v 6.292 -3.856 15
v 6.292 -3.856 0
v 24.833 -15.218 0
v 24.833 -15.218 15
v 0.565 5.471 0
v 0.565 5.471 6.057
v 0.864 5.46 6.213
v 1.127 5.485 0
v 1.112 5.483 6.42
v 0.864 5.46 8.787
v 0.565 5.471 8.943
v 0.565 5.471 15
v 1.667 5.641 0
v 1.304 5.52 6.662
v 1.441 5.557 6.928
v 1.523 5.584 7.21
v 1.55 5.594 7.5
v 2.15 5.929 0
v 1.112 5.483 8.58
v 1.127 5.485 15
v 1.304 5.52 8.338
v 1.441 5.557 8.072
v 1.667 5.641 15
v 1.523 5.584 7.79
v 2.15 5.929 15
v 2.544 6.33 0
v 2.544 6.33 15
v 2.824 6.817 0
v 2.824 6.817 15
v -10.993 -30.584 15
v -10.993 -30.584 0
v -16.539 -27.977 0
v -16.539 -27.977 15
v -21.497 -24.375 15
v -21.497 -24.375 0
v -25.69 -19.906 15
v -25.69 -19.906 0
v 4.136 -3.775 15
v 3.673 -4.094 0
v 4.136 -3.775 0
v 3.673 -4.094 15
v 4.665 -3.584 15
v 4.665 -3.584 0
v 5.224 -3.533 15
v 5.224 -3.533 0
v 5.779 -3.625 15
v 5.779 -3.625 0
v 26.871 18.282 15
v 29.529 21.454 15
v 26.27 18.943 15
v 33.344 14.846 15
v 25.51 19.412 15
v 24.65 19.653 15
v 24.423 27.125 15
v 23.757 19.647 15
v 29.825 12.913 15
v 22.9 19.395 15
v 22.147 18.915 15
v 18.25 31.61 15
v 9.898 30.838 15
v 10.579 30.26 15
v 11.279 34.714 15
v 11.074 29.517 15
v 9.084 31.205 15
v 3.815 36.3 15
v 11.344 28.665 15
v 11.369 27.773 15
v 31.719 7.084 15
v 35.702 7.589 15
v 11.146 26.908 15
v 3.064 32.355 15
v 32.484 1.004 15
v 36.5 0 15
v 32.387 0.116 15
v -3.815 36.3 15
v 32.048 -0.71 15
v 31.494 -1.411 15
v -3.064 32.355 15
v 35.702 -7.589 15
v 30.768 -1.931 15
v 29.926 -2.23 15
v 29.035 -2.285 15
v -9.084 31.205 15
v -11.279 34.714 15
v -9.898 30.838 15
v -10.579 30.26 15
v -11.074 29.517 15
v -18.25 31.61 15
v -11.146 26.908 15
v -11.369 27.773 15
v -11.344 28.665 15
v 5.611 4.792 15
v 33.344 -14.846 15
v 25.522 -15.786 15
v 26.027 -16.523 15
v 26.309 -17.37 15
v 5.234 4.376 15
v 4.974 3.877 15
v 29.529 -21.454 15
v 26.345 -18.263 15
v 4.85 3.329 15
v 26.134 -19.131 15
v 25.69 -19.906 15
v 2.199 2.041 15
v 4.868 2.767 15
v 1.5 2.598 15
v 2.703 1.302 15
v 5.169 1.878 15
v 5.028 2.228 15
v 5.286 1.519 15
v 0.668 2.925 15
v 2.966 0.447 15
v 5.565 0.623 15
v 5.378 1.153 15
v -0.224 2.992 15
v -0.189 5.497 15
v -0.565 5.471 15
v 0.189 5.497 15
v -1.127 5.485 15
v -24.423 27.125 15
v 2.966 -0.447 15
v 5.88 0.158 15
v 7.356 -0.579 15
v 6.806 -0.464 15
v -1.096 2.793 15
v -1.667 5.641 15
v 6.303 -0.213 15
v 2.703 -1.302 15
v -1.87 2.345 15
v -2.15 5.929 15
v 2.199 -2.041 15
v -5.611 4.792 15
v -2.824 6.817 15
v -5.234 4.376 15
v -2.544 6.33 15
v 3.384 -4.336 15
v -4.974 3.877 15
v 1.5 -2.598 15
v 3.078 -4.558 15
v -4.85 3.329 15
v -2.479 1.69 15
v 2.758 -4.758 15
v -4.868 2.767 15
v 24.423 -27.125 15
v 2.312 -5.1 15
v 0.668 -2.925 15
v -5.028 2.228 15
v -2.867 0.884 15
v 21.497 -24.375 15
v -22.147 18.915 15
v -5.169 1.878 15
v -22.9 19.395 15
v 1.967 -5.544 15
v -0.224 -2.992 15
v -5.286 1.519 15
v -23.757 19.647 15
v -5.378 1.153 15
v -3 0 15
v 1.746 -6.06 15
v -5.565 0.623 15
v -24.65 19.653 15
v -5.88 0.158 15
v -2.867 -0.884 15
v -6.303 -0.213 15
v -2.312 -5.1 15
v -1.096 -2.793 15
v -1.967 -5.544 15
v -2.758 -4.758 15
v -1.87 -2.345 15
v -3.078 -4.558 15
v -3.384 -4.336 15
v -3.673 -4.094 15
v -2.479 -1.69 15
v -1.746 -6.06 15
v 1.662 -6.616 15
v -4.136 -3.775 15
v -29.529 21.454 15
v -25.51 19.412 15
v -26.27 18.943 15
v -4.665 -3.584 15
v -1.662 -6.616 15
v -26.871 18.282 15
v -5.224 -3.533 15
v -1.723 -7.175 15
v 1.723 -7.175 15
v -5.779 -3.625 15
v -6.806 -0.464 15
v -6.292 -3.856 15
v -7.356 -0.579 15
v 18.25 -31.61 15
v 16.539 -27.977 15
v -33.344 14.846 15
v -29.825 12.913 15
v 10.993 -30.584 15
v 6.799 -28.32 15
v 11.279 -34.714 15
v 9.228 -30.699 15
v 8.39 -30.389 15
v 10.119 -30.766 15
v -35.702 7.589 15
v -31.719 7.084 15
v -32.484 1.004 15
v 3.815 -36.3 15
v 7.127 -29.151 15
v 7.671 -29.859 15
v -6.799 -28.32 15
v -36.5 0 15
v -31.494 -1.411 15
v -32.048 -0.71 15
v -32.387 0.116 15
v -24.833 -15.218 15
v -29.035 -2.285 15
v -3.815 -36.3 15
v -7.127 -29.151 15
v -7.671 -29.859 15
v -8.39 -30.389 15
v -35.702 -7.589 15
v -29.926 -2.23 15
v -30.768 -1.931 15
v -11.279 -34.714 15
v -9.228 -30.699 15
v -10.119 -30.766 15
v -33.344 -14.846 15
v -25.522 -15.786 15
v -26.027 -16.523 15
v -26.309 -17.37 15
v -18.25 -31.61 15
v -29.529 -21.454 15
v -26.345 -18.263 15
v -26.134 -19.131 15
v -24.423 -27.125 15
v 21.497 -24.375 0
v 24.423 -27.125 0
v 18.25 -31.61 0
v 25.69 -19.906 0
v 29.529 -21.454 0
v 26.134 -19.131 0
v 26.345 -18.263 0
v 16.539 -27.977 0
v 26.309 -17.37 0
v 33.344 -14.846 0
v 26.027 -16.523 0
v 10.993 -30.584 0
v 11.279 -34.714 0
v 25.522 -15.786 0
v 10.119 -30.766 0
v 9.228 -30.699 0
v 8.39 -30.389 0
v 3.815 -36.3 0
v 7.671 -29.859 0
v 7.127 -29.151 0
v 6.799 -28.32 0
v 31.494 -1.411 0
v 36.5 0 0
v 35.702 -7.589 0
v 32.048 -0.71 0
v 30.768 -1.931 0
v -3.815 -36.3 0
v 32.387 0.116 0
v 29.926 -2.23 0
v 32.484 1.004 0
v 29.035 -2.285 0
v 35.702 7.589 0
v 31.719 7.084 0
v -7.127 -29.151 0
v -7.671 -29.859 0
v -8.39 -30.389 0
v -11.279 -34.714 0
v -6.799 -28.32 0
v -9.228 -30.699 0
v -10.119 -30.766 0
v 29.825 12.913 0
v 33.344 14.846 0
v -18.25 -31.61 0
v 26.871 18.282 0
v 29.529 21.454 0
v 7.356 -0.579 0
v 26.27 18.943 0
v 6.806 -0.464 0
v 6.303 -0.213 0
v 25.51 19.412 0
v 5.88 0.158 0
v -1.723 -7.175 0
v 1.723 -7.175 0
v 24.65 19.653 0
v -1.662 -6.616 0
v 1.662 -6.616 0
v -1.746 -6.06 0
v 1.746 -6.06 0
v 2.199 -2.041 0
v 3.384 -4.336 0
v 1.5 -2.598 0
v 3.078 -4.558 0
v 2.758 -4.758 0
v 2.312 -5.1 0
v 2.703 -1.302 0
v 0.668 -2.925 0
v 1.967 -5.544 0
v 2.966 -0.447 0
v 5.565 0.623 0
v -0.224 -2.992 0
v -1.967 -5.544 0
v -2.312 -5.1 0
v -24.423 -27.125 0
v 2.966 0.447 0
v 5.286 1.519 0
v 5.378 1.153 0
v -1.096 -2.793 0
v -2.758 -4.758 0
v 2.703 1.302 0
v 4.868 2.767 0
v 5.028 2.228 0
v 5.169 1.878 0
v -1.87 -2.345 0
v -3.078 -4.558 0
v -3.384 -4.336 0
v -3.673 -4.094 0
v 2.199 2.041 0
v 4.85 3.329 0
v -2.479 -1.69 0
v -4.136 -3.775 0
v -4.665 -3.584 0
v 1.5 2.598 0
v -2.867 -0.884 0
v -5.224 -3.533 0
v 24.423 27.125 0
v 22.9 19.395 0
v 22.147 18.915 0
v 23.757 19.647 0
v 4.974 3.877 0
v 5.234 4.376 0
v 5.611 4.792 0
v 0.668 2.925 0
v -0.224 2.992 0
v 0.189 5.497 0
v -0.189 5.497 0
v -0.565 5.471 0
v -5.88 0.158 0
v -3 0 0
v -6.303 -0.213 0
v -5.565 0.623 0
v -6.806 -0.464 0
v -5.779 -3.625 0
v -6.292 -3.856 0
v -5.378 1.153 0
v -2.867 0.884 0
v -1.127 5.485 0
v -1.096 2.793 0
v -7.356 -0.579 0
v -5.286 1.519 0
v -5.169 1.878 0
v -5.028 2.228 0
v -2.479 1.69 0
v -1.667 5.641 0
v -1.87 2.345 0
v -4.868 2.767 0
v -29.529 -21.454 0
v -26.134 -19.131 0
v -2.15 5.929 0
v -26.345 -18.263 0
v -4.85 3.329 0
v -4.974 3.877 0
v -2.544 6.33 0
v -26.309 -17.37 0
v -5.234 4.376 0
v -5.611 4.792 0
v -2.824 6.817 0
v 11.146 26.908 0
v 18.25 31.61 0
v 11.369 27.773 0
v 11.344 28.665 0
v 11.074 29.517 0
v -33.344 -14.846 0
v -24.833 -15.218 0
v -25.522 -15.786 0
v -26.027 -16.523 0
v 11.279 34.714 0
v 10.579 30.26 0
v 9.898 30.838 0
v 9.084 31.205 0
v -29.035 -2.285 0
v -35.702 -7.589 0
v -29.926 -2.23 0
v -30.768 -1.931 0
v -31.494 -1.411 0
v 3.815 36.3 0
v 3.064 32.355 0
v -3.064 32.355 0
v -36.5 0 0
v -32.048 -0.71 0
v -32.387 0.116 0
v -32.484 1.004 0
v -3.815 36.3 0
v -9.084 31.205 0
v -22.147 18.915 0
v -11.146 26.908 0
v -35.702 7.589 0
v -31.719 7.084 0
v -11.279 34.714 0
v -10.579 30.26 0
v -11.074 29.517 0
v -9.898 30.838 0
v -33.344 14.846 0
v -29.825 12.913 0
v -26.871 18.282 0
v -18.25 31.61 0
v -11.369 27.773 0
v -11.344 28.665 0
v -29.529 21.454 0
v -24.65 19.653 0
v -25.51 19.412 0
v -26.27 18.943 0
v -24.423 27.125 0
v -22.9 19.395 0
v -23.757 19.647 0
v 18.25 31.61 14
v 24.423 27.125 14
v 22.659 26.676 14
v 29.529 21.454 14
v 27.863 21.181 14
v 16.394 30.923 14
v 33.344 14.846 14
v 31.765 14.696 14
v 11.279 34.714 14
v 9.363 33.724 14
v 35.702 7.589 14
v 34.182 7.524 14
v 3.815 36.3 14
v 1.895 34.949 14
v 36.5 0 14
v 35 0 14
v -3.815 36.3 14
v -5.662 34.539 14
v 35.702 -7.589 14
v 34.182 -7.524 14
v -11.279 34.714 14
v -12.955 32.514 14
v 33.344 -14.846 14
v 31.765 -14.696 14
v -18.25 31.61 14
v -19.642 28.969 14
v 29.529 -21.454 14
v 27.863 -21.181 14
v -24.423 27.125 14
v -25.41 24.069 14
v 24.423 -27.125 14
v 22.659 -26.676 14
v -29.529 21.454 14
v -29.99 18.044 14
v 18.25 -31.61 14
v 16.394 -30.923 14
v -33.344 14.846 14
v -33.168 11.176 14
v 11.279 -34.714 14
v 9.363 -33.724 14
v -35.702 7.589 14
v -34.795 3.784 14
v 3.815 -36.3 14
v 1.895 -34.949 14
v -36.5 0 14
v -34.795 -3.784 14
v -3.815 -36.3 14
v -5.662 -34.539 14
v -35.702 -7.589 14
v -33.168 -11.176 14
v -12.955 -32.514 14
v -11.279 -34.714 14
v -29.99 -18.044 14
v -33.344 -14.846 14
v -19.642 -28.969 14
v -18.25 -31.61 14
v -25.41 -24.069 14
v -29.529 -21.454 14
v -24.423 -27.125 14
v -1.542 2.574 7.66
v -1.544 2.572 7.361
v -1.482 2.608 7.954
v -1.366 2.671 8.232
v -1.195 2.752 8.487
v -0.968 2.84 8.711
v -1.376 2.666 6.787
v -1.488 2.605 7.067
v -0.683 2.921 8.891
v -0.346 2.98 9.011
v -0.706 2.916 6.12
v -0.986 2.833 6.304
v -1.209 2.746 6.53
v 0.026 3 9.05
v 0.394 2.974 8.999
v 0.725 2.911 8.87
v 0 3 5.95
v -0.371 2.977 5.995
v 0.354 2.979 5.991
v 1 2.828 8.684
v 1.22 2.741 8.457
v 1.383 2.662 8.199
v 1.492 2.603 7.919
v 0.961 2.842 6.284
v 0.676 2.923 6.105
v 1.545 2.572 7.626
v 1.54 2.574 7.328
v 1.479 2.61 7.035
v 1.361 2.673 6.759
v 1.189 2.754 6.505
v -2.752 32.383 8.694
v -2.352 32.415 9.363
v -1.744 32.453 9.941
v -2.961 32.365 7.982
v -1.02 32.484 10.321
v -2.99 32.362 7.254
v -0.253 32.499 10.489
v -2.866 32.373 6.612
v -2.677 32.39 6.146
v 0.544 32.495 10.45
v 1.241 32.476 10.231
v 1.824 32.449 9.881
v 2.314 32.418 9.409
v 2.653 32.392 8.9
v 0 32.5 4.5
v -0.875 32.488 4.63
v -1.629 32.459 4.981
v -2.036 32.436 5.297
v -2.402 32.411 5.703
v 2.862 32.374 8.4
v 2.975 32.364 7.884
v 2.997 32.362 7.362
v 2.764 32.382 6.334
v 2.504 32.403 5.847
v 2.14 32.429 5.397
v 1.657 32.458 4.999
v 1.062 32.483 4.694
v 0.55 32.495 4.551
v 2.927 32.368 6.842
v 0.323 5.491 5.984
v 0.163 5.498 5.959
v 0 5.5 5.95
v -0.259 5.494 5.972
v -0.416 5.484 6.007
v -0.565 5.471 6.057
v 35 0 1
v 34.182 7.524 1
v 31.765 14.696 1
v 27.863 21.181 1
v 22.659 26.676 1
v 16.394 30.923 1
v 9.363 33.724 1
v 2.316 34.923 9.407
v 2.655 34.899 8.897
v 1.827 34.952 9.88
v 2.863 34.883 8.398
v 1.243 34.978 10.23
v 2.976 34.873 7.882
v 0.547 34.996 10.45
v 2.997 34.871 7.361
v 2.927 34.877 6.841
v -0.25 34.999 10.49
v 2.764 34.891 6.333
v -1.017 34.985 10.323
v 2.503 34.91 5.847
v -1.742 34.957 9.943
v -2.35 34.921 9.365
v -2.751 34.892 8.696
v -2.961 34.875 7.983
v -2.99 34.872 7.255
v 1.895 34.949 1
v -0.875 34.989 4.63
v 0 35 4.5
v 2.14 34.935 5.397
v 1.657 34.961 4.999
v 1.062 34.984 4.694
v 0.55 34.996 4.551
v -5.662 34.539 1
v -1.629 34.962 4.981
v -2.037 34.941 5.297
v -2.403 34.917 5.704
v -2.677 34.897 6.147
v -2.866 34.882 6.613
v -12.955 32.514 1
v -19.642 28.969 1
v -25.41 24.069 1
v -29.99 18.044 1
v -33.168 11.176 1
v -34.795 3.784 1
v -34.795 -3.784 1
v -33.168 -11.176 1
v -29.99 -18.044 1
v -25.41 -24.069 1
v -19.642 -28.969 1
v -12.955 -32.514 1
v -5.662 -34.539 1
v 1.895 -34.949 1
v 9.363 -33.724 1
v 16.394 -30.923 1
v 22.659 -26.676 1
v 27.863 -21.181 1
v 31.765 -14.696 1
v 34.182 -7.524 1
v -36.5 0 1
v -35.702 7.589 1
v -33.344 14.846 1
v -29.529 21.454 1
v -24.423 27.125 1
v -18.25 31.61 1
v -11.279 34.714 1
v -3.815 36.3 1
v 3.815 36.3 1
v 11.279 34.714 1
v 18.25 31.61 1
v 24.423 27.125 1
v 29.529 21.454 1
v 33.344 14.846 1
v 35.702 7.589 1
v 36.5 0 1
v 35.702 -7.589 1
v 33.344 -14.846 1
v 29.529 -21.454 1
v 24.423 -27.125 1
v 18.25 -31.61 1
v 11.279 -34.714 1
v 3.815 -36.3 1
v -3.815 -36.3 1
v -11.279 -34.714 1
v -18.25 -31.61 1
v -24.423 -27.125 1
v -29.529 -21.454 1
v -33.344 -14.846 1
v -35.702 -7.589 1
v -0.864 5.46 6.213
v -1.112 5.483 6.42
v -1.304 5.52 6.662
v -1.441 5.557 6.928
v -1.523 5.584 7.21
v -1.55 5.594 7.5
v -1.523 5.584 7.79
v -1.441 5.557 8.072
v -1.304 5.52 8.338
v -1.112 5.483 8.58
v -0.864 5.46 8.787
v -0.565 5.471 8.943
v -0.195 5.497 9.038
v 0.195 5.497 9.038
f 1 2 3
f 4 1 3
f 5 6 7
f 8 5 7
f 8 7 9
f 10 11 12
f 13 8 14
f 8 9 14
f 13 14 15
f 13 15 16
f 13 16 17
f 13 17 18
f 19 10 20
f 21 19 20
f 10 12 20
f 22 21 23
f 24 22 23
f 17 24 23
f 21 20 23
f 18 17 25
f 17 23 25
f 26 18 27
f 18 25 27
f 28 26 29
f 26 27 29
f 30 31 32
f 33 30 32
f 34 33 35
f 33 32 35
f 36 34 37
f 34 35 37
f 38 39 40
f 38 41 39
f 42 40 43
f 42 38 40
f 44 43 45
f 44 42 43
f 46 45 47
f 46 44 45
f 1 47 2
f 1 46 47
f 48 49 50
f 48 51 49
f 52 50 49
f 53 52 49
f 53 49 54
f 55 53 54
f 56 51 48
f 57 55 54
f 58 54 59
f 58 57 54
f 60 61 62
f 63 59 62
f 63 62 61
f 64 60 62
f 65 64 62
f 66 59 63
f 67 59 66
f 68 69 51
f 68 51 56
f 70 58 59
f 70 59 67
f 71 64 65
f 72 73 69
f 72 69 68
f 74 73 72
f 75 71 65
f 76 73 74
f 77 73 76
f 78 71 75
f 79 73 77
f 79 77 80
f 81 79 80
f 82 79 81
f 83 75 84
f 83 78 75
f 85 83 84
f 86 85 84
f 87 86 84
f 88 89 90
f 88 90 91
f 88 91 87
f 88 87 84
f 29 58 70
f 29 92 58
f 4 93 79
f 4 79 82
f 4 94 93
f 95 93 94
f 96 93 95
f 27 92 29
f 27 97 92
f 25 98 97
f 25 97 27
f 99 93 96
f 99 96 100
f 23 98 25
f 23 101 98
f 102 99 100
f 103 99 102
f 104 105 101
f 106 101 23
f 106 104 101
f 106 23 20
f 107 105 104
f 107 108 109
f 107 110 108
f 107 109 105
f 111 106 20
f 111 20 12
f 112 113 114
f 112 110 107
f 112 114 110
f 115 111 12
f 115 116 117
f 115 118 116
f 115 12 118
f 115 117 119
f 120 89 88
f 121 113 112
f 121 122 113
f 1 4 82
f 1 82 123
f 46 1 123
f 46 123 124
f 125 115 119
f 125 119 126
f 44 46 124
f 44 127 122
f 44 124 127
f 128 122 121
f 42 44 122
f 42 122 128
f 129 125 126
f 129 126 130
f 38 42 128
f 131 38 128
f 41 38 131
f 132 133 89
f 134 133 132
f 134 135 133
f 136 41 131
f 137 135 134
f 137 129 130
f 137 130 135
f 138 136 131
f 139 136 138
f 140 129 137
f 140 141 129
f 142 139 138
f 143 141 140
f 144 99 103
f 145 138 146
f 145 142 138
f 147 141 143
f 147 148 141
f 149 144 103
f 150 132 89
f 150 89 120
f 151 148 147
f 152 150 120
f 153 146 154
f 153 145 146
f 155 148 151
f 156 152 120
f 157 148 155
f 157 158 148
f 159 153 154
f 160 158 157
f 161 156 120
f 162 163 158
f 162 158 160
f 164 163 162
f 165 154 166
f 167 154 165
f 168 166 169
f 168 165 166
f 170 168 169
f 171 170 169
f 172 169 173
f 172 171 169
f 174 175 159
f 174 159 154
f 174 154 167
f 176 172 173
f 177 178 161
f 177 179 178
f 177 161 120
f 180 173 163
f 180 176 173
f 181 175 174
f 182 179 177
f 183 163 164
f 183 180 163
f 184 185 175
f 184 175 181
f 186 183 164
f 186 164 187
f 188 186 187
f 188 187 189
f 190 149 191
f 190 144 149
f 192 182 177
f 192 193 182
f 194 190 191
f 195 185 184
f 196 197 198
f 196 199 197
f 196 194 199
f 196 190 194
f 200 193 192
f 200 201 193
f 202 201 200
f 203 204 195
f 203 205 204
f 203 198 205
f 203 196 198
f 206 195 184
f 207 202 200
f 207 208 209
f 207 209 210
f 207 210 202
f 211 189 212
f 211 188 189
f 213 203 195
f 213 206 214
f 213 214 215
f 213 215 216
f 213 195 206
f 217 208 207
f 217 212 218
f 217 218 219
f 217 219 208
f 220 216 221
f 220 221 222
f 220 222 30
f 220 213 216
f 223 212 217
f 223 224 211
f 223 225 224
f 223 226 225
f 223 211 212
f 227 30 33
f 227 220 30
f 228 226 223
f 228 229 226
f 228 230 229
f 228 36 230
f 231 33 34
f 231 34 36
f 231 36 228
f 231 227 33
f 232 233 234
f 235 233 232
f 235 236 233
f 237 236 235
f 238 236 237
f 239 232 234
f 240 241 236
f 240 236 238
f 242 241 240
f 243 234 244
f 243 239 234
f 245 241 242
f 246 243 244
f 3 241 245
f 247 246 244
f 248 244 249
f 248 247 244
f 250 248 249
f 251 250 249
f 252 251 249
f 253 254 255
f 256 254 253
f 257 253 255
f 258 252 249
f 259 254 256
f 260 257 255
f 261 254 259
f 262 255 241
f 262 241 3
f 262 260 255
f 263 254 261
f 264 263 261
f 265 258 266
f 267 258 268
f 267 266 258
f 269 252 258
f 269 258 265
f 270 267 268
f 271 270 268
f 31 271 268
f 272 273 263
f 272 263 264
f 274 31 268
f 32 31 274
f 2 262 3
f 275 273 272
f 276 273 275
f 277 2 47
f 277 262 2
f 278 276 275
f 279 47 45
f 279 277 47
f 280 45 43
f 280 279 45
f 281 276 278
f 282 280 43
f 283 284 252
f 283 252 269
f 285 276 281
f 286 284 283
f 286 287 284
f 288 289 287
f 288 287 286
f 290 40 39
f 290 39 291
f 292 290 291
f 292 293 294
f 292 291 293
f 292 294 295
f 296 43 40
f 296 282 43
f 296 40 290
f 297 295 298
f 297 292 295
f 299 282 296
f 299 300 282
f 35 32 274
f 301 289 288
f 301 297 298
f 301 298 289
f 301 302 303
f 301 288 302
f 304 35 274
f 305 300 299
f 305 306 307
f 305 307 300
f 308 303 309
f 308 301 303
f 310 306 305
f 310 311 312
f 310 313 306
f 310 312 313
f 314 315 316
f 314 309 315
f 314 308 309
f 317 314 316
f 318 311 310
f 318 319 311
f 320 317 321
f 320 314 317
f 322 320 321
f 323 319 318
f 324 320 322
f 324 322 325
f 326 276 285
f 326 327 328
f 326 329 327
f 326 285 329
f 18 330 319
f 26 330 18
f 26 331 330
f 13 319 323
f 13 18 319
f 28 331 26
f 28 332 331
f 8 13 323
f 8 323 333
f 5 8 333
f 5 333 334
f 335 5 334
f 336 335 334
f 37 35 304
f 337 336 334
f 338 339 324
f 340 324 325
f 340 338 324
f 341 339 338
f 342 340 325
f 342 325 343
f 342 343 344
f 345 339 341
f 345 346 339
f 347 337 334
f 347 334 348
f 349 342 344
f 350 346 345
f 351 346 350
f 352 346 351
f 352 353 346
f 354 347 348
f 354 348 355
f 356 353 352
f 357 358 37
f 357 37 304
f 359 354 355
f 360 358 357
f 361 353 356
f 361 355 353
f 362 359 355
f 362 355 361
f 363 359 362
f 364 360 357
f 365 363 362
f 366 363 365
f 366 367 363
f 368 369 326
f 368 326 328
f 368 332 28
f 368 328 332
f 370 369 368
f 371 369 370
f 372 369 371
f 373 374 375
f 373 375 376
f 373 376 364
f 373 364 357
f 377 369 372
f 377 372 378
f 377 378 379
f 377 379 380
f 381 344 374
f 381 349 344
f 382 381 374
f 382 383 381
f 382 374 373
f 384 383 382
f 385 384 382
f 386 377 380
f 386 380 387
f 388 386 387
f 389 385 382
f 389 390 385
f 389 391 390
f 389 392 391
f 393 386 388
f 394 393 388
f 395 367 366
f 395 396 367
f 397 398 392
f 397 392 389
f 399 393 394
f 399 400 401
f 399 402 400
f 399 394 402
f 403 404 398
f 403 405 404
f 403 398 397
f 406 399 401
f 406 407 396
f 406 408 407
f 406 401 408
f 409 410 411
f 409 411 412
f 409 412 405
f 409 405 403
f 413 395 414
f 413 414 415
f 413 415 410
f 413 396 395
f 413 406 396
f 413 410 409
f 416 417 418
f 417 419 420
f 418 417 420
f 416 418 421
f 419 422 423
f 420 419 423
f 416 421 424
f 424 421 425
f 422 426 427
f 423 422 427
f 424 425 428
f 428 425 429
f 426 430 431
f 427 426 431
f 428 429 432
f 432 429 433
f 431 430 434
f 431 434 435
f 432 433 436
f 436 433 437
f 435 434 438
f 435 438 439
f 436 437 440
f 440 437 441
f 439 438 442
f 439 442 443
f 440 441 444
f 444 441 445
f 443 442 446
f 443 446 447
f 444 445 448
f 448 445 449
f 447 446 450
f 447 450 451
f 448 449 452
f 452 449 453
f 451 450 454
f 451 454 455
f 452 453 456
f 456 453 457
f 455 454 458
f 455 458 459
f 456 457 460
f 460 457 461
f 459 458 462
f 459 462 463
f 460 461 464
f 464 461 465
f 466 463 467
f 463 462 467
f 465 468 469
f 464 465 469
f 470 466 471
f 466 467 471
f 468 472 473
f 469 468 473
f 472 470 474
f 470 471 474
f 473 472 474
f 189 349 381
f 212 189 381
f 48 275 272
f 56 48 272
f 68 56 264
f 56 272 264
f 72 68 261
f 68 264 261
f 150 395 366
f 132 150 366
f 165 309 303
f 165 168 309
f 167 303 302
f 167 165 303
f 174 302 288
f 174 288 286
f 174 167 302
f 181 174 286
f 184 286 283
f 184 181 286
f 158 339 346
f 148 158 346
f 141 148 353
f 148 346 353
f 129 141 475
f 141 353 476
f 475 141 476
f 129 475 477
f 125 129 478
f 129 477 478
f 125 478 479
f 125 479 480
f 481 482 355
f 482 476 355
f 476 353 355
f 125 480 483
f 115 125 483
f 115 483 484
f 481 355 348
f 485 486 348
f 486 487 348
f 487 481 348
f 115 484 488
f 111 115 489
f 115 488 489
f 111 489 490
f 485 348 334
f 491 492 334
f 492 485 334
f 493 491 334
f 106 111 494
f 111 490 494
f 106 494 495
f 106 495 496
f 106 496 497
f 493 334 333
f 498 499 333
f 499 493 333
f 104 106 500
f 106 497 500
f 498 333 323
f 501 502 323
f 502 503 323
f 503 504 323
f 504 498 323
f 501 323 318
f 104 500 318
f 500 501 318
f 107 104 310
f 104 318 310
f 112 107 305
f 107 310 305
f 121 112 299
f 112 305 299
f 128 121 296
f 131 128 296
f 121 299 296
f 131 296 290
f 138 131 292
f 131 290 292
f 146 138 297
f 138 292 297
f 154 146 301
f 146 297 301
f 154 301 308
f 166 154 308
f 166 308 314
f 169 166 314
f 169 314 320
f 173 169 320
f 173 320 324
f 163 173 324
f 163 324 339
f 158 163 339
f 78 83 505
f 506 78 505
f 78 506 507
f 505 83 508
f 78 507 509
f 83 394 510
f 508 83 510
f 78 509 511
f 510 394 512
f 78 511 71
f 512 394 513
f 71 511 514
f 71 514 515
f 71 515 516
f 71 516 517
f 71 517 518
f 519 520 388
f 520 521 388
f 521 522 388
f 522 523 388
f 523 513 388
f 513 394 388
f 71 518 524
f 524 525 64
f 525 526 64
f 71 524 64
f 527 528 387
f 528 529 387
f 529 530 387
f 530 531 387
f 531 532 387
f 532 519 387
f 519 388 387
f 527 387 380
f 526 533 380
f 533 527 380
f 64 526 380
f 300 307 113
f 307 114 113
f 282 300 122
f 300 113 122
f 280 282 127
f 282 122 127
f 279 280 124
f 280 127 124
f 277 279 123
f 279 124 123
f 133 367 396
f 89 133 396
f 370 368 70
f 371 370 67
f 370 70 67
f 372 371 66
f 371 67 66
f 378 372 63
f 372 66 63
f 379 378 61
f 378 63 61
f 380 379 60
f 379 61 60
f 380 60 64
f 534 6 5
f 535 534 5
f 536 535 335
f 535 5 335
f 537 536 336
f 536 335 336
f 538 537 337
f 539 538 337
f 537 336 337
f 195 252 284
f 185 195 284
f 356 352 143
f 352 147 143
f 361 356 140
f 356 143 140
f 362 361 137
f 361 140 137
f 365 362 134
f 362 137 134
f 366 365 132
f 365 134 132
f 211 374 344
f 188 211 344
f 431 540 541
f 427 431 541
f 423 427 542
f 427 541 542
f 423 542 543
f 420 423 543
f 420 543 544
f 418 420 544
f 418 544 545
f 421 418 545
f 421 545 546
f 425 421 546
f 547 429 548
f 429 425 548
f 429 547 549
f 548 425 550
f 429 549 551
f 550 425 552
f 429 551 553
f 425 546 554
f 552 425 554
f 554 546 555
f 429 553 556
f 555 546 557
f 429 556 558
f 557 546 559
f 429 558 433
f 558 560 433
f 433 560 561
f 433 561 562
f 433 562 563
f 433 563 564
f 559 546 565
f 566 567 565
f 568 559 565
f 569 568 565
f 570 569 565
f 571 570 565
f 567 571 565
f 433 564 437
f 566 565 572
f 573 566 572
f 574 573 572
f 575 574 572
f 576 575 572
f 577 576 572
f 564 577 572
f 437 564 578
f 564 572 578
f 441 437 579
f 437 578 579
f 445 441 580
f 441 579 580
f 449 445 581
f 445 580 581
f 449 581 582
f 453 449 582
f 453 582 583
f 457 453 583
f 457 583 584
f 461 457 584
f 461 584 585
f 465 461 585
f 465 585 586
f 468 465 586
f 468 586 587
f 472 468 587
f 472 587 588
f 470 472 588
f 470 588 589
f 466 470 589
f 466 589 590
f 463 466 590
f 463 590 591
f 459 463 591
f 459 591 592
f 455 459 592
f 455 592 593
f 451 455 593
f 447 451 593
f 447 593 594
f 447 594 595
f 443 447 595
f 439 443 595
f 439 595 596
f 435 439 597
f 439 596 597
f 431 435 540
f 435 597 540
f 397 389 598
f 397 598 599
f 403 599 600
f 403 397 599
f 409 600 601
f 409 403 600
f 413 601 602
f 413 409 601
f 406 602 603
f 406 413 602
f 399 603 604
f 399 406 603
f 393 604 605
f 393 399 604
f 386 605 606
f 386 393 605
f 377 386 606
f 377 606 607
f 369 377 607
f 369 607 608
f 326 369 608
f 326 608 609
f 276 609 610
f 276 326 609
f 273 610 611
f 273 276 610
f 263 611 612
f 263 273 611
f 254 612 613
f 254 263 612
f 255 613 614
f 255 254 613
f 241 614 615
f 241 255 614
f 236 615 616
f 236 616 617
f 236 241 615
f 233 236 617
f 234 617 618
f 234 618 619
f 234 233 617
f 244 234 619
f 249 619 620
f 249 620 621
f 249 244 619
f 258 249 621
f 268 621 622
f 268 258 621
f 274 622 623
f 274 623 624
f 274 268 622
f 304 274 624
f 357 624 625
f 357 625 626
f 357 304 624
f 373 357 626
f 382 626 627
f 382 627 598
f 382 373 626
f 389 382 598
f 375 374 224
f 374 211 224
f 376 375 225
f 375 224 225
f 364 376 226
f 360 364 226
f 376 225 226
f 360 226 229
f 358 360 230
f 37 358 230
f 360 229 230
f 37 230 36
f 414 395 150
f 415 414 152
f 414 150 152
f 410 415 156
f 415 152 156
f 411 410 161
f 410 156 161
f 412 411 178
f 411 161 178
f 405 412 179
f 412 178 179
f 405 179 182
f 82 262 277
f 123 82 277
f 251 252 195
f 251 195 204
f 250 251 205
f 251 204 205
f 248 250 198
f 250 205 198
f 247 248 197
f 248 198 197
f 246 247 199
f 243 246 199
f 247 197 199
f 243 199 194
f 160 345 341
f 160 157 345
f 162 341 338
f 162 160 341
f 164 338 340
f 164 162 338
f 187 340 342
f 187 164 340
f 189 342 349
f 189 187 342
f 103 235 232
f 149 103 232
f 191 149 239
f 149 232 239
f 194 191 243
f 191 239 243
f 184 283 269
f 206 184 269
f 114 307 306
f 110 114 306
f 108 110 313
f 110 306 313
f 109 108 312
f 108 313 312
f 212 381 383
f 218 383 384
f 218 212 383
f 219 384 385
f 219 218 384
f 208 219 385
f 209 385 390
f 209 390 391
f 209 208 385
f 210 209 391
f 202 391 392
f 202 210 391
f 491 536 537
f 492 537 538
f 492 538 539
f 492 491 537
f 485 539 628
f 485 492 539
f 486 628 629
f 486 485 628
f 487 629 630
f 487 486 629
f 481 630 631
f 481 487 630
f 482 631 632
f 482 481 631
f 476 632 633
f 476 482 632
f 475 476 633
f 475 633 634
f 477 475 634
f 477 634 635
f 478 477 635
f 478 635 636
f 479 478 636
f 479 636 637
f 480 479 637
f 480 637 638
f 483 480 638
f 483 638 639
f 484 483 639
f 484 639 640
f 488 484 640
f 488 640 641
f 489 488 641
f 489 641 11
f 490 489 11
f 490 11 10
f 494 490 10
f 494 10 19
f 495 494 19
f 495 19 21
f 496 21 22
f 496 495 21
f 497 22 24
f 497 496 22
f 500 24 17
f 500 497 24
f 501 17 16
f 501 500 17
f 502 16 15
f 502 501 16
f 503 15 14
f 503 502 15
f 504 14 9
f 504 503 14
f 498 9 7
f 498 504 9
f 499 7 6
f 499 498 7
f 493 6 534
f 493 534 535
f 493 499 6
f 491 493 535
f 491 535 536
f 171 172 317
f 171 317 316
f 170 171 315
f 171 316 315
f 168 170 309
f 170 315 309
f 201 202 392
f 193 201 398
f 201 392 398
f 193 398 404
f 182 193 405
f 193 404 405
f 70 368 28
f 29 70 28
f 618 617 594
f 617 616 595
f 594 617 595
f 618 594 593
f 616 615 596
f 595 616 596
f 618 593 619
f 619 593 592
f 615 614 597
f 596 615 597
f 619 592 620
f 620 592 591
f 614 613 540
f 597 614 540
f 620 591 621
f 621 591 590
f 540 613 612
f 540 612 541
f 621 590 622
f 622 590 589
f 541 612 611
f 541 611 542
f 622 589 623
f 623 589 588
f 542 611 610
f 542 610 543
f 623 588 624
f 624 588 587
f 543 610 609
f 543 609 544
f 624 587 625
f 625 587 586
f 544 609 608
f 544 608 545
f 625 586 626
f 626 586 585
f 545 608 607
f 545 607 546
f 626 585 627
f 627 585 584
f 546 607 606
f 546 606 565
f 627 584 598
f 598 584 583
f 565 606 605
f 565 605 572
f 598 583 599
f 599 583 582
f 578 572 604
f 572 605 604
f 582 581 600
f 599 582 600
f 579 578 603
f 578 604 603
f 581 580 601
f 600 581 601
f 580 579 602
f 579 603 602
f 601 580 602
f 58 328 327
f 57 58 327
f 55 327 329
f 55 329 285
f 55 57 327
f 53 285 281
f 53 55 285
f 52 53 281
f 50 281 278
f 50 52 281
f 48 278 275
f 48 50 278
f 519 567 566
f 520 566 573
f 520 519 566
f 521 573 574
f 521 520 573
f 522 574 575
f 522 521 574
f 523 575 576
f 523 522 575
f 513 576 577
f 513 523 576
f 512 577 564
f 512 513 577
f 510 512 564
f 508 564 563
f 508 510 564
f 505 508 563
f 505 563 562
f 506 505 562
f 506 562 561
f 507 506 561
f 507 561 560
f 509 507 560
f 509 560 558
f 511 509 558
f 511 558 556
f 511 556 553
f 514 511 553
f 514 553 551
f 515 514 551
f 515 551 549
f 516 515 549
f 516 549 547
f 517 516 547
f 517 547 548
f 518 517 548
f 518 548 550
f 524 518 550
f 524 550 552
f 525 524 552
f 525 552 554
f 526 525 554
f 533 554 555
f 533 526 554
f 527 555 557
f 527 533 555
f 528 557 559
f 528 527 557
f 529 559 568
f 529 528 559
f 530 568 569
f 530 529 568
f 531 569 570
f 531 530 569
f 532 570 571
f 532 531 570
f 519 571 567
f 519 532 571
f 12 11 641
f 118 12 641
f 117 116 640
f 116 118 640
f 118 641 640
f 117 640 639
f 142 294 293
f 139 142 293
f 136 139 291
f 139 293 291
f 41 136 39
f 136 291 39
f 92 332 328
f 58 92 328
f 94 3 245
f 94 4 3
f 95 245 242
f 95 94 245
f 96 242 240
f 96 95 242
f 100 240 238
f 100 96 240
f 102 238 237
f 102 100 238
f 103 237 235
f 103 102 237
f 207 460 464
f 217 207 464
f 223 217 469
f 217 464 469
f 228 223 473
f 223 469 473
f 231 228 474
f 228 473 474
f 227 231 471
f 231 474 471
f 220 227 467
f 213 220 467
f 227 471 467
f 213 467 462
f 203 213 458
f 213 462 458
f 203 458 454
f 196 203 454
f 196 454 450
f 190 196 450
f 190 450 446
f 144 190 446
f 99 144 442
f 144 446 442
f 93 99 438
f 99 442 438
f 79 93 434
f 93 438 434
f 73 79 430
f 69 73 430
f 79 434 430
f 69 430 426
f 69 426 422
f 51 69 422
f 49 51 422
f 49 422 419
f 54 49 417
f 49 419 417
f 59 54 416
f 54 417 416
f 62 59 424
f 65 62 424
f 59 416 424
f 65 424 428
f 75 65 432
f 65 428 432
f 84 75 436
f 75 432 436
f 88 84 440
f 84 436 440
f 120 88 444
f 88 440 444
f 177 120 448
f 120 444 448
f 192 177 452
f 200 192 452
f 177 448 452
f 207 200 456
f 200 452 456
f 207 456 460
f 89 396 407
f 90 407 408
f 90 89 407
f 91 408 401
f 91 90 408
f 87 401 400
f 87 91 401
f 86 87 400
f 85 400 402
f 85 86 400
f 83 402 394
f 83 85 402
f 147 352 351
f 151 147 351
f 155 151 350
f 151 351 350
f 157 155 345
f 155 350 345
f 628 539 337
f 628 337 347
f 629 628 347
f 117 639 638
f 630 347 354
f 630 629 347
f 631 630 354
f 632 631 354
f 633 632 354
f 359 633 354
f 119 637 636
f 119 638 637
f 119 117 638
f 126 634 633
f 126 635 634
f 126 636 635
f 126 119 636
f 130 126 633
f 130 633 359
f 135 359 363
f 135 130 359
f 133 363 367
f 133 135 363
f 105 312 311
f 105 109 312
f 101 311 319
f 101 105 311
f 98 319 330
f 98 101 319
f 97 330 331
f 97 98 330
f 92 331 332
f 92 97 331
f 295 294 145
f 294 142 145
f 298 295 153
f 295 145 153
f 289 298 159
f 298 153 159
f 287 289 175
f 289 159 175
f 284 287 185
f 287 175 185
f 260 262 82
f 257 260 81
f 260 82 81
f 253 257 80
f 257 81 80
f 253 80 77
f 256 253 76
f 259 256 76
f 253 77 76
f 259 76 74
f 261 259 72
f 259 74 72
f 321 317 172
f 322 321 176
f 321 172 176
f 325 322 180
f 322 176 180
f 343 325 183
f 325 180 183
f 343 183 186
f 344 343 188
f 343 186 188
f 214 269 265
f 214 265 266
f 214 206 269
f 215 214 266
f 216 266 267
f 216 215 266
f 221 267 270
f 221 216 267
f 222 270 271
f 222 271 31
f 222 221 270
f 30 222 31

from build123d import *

# Parameters (mm, degrees)
SKETCH1_R               = 35
BOSS_EXTRUDE1_DEPTH     = 15
SKETCH2_R               = 3
CUT_EXTRUDE1_DEPTH      = 52.720402164
CUT_EXTRUDE3_DEPTH      = 52.720402164
CIRPATTERN1_COUNT       = 5
FILLET4_R               = 2.2
FILLET5_R               = 3.2
SKETCH5_R               = 36.5
SKETCH5_R_2             = 35
BOSS_EXTRUDE2_DEPTH     = 1
BOSS_EXTRUDE3_START     = -1
SKETCH6_R               = 36.5
SKETCH6_R_2             = 35
BOSS_EXTRUDE3_DEPTH     = 1
SKETCH7_R               = 1.55
CUT_EXTRUDE4_DEPTH      = 54.754069613
CUT_EXTRUDE5_DEPTH      = 54.754069641
CUT_EXTRUDE5_DEPTH_BACK = 1
CUT_EXTRUDE5_START      = 20
SKETCH8_R               = 3


with BuildPart() as part:
    # Sketch1 → Boss-Extrude1 (new body)
    with BuildSketch(Plane.XY):
        Circle(SKETCH1_R)
    extrude(amount=BOSS_EXTRUDE1_DEPTH)

    # Sketch2 → Cut-Extrude1 (cut, through all)
    with BuildSketch(Plane(origin=(0, 0, 0), x_dir=(-1, 0, 0), z_dir=(0, 0, -1))):
        Circle(SKETCH2_R)
    extrude(amount=-CUT_EXTRUDE1_DEPTH, mode=Mode.SUBTRACT)

    # Sketch4 → Cut-Extrude3 (cut, through all)
    with BuildSketch(Plane(origin=(0, 0, 0), x_dir=(-1, 0, 0), z_dir=(0, 0, -1))):
        with BuildLine():
            Line((2.104758878, 5.081337429), (12.437211552, 30.026084807))
            ThreePointArc((12.437211552, 30.026084807), (0, 32.5), (-12.437211552, 30.026084807))
            Line((-12.437211552, 30.026084807), (-2.104758878, 5.081337429))
            ThreePointArc((-2.104758878, 5.081337429), (0, 5.5), (2.104758878, 5.081337429))
        make_face()
    cut_extrude3 = extrude(amount=-CUT_EXTRUDE3_DEPTH, mode=Mode.SUBTRACT)

    # CirPattern1: Cut-Extrude3 ×5 about axis
    cirpattern1_axis = Axis((0, 0, 0), (0, 0, 1))
    for i in range(1, CIRPATTERN1_COUNT):
        add(cut_extrude3.rotate(cirpattern1_axis, i * 360 / CIRPATTERN1_COUNT), mode=Mode.SUBTRACT)

    # Fillet4
    fillet4_edges = [part.edges().sort_by_distance(p)[0] for p in [
        (-2.104758878, 5.081337429, 7.5),
        (2.104758878, 5.081337429, 7.5),
        (-5.483045336, -0.431525027, 7.5),
        (-4.182232811, 3.571964266, 7.5),
        (-1.283949501, -5.348034562, 7.5),
        (-4.689520904, -2.873742106, 7.5),
        (4.689520904, -2.873742106, 7.5),
        (1.283949501, -5.348034562, 7.5),
        (4.182232811, 3.571964266, 7.5),
        (5.483045336, -0.431525027, 7.5),
    ]]
    fillet(fillet4_edges, radius=FILLET4_R)

    # Fillet5
    fillet5_edges = [part.edges().sort_by_distance(p)[0] for p in [
        (12.437211552, 30.026084807, 7.5),
        (-12.437211552, 30.026084807, 7.5),
        (-24.713193882, 21.107061571, 7.5),
        (-32.399813346, -2.549920611, 7.5),
        (-27.710805342, -16.981203353, 7.5),
        (-7.586974325, -31.602022413, 7.5),
        (7.586974325, -31.602022413, 7.5),
        (27.710805342, -16.981203353, 7.5),
        (32.399813346, -2.549920611, 7.5),
        (24.713193882, 21.107061571, 7.5),
    ]]
    fillet(fillet5_edges, radius=FILLET5_R)

    # Sketch5 → Boss-Extrude2 (add)
    with BuildSketch(Plane(origin=(0, 0, 0), x_dir=(-1, 0, 0), z_dir=(0, 0, -1))):
        Circle(SKETCH5_R)
        Circle(SKETCH5_R_2, mode=Mode.SUBTRACT)
    extrude(amount=-BOSS_EXTRUDE2_DEPTH)

    # Sketch6 → Boss-Extrude3 (add)
    with BuildSketch(Plane.XY.offset(15).offset(BOSS_EXTRUDE3_START)):
        with Locations(Location((0, 0, 0), (0, 0, 180))):
            Circle(SKETCH6_R)
        with Locations(Location((0, 0, 0), (0, 0, 180))):
            Circle(SKETCH6_R_2, mode=Mode.SUBTRACT)
    extrude(amount=BOSS_EXTRUDE3_DEPTH)

    # Sketch7 → Cut-Extrude4 (cut, through all)
    with BuildSketch(Plane(origin=(0, 0, 0), x_dir=(1, 0, 0), z_dir=(0, 1, 0))):
        with Locations(Location((0, -7.5, 0), (0, 0, 90))):
            Circle(SKETCH7_R)
    extrude(amount=CUT_EXTRUDE4_DEPTH, mode=Mode.SUBTRACT)

    # Sketch8 → Cut-Extrude5 (cut, two sides: drawn at the far end of the back side and taken through both)
    with BuildSketch(Plane(origin=(0, 0, 0), x_dir=(1, 0, 0), z_dir=(0, 1, 0)).offset(CUT_EXTRUDE5_START - CUT_EXTRUDE5_DEPTH_BACK)):
        with Locations(Location((0, -7.5, 0), (0, 0, 90))):
            Circle(SKETCH8_R)
    extrude(amount=CUT_EXTRUDE5_DEPTH + CUT_EXTRUDE5_DEPTH_BACK, mode=Mode.SUBTRACT)


solid = part.part
